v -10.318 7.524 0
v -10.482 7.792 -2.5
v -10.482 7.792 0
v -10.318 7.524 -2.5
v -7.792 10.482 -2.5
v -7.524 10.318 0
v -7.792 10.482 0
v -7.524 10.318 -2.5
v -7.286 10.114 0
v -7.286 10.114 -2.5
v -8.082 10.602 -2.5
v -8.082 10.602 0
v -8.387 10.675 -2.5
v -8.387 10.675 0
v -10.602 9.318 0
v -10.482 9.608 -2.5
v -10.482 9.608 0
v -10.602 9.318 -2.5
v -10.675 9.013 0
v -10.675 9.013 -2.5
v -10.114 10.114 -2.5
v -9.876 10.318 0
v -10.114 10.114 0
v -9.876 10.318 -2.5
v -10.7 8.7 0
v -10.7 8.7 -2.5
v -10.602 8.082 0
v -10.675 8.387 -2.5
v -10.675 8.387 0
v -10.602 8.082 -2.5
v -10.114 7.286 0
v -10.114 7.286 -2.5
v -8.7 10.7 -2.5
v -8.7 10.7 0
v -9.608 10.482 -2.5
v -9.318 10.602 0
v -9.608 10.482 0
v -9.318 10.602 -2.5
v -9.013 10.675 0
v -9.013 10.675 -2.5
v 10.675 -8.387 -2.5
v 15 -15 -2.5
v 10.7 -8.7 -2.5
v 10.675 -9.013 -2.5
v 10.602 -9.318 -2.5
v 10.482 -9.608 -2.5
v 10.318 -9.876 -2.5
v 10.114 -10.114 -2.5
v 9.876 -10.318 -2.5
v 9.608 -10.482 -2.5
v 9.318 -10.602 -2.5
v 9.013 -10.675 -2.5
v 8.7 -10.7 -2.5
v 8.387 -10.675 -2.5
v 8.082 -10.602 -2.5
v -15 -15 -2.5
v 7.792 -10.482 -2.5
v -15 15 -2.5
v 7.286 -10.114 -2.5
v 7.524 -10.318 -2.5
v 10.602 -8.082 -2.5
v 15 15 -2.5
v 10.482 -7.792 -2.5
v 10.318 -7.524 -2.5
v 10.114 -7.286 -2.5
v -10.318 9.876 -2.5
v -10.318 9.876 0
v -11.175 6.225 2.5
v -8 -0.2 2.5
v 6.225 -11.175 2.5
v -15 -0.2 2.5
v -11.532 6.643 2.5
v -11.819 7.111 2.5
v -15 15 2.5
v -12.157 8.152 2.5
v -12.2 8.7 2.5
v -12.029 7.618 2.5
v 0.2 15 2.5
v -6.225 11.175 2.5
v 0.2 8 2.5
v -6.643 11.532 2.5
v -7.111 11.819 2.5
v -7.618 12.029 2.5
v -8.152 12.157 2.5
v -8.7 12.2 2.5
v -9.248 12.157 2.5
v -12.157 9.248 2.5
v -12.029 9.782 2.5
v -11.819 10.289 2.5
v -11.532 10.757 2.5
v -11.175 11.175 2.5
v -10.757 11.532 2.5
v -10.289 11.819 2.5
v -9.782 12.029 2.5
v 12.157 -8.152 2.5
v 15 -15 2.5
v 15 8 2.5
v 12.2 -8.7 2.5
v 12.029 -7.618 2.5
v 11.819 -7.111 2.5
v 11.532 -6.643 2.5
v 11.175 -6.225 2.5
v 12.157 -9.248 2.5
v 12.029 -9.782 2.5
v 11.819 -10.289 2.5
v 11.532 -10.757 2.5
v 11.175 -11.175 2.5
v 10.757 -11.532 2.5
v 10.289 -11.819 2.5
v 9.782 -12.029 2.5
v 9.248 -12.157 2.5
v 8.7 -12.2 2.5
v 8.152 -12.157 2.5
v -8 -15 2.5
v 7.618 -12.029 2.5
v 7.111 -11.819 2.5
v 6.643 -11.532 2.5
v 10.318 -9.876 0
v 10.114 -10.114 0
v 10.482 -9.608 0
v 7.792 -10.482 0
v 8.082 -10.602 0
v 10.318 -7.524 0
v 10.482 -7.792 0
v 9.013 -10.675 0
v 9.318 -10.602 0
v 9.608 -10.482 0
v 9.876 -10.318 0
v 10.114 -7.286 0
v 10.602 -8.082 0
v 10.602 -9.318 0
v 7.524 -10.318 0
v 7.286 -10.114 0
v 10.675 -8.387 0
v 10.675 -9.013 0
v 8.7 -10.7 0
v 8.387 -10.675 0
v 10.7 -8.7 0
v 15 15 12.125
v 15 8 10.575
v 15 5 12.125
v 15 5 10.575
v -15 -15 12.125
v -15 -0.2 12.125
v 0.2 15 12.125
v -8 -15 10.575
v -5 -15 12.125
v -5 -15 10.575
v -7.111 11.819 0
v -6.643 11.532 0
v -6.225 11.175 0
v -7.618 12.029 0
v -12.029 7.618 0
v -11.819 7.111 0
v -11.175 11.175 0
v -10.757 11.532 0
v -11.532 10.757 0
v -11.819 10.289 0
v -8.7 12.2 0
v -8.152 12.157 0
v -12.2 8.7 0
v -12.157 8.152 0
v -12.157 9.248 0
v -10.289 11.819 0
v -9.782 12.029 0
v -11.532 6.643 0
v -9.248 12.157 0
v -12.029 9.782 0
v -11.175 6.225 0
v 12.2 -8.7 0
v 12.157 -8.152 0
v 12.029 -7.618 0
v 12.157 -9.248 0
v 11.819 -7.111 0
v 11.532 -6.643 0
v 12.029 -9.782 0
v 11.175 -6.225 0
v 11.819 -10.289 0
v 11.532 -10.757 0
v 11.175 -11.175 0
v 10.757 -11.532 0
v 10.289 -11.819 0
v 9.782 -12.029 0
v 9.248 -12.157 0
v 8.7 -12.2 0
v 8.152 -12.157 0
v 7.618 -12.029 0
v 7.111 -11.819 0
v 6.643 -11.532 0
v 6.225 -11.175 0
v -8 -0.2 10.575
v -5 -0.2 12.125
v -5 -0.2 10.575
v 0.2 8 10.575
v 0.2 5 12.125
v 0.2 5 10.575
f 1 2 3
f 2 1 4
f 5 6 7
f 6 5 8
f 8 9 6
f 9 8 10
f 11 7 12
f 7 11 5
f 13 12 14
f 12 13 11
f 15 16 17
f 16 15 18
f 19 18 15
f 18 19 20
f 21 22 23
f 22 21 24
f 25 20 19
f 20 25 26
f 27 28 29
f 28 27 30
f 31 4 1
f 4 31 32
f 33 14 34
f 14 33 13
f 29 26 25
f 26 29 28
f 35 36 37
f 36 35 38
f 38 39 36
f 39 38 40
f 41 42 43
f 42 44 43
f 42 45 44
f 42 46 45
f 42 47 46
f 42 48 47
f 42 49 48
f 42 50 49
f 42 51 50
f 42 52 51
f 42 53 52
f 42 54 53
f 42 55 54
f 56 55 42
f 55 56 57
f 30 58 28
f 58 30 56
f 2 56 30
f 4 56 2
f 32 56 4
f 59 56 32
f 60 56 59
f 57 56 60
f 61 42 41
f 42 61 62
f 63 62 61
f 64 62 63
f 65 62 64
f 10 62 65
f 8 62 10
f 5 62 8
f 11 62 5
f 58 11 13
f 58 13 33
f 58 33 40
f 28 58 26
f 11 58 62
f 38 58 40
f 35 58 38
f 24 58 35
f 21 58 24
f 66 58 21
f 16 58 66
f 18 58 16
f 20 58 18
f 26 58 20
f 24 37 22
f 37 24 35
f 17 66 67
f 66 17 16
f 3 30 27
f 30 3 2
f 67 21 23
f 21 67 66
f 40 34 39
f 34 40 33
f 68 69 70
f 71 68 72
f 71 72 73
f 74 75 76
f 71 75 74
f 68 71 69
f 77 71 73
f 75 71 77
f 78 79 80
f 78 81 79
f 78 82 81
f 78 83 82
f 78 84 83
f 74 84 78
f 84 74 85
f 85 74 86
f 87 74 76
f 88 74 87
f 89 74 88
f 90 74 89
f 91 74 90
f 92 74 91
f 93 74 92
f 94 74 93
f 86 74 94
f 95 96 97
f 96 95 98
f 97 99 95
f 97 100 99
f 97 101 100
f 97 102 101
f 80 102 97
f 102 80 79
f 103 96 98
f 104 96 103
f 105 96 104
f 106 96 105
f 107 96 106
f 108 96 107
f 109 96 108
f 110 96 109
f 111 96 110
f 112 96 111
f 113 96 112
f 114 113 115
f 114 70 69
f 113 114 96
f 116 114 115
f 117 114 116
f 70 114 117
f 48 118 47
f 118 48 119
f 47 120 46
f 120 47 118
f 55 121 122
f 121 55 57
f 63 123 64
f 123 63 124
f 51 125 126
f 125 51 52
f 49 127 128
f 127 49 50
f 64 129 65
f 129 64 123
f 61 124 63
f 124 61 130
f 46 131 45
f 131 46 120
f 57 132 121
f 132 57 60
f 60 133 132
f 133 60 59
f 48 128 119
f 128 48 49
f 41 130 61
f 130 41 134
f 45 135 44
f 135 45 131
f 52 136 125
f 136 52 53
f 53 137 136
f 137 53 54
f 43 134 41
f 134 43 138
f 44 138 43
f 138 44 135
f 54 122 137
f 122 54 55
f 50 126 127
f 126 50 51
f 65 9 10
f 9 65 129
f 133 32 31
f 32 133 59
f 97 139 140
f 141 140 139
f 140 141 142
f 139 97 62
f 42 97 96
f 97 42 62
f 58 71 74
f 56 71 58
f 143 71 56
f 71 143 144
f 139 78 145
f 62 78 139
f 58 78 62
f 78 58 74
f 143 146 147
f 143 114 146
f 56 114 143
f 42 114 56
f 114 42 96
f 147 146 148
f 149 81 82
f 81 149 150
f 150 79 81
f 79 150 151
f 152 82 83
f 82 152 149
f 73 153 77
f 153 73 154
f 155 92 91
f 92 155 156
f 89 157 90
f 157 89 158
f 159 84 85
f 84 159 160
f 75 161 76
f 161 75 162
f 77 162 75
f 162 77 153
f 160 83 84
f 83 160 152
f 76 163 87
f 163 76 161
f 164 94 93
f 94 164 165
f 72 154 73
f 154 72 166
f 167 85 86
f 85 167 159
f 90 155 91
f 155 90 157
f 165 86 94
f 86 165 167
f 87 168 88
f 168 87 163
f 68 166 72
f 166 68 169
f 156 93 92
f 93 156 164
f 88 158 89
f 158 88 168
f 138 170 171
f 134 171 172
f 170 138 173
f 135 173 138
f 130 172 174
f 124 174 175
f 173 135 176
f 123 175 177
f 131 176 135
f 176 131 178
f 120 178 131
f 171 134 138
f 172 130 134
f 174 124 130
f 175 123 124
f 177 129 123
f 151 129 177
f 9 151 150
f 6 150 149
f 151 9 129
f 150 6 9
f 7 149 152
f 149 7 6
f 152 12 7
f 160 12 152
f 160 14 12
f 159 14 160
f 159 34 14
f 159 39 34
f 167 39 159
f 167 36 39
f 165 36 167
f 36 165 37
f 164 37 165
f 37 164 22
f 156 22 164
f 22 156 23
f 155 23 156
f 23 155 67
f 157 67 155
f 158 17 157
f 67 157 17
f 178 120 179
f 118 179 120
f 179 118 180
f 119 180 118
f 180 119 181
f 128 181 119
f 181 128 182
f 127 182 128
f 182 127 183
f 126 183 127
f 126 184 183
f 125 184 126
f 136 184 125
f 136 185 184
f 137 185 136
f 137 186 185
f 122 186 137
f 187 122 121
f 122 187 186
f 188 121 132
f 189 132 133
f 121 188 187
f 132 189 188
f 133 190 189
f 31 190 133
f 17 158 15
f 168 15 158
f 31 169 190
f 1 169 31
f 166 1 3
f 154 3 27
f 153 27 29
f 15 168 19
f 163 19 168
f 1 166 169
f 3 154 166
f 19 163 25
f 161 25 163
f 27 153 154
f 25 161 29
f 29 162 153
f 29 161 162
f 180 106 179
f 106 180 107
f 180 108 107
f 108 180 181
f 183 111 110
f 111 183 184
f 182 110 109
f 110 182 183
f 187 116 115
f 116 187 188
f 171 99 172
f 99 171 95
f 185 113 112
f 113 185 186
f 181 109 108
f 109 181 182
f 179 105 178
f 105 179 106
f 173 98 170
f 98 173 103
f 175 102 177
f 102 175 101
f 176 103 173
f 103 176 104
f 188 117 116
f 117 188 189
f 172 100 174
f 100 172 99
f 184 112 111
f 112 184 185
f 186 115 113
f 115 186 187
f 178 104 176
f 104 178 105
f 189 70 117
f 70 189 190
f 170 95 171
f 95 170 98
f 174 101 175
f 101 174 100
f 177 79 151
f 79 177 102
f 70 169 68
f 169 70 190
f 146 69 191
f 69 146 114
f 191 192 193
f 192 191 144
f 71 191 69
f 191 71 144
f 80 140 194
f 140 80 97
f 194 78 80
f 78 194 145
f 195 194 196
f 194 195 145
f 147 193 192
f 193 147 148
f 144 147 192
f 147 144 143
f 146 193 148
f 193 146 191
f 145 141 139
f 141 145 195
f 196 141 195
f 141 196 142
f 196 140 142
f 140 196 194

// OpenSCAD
$fn=40;
clipWidth = 30;
clipLength =30;
clipDepth = 5;
//bottomTrackLength=27;
bottomTrackLength=sqrt(clipWidth*clipWidth+clipLength*clipLength)*.58;

bottomTrackWidth=4;
topTrackWidth=7;

columnWidth=14.8;
//my bed is 8mm thick
//.75 is measured error from first printing
columnHeight=8+.1+.75;
columnDepth=7;

wedgeWidth=columnWidth;
//my glass is 2.25mm thick
wedgeHeight=2.25-.7;
wedgeOverhang=3;
wedgeDepth=columnDepth+wedgeOverhang;

union()
{
    difference()
    {
        difference()
        {
            cube([clipWidth,clipLength,clipDepth],true);
            rotate([0,0,45])
            union()
            {
                translate([0,bottomTrackLength/2,0])
                cylinder(h=5,d=bottomTrackWidth,center=true);
                translate([0,-bottomTrackLength/2,0])
                cylinder(h=5,d=bottomTrackWidth,center=true);
                cube([bottomTrackWidth,bottomTrackLength,5],true);
            }
        }
        rotate([0,0,45])
        translate([0,0,5/2])
        union()
        {
            translate([0,bottomTrackLength/2,0])
            cylinder(h=5,d=topTrackWidth,center=true);
            translate([0,-bottomTrackLength/2,0])
            cylinder(h=5,d=topTrackWidth,center=true);
            cube([topTrackWidth,bottomTrackLength,5],true);
        }
    }

    translate([-clipWidth/2+columnDepth/2,-clipLength/2+columnWidth/2,clipDepth/2+columnHeight/2])
    cube([columnDepth,columnWidth,columnHeight],true);

    translate([clipWidth/2-columnWidth/2,clipLength/2-columnDepth/2,clipDepth/2+columnHeight/2])
    rotate([0,0,90])
    cube([columnDepth,columnWidth,columnHeight],true);
    
    translate([-clipWidth/2+wedgeDepth/2,-clipLength/2+columnWidth/2,clipDepth/2+columnHeight])
    cube([wedgeDepth,wedgeWidth,wedgeHeight],true);
    
    translate([clipWidth/2-columnWidth/2,clipLength/2-wedgeDepth/2,clipDepth/2+columnHeight])
    rotate([0,0,90])
    cube([wedgeDepth,wedgeWidth,wedgeHeight],true);
}
